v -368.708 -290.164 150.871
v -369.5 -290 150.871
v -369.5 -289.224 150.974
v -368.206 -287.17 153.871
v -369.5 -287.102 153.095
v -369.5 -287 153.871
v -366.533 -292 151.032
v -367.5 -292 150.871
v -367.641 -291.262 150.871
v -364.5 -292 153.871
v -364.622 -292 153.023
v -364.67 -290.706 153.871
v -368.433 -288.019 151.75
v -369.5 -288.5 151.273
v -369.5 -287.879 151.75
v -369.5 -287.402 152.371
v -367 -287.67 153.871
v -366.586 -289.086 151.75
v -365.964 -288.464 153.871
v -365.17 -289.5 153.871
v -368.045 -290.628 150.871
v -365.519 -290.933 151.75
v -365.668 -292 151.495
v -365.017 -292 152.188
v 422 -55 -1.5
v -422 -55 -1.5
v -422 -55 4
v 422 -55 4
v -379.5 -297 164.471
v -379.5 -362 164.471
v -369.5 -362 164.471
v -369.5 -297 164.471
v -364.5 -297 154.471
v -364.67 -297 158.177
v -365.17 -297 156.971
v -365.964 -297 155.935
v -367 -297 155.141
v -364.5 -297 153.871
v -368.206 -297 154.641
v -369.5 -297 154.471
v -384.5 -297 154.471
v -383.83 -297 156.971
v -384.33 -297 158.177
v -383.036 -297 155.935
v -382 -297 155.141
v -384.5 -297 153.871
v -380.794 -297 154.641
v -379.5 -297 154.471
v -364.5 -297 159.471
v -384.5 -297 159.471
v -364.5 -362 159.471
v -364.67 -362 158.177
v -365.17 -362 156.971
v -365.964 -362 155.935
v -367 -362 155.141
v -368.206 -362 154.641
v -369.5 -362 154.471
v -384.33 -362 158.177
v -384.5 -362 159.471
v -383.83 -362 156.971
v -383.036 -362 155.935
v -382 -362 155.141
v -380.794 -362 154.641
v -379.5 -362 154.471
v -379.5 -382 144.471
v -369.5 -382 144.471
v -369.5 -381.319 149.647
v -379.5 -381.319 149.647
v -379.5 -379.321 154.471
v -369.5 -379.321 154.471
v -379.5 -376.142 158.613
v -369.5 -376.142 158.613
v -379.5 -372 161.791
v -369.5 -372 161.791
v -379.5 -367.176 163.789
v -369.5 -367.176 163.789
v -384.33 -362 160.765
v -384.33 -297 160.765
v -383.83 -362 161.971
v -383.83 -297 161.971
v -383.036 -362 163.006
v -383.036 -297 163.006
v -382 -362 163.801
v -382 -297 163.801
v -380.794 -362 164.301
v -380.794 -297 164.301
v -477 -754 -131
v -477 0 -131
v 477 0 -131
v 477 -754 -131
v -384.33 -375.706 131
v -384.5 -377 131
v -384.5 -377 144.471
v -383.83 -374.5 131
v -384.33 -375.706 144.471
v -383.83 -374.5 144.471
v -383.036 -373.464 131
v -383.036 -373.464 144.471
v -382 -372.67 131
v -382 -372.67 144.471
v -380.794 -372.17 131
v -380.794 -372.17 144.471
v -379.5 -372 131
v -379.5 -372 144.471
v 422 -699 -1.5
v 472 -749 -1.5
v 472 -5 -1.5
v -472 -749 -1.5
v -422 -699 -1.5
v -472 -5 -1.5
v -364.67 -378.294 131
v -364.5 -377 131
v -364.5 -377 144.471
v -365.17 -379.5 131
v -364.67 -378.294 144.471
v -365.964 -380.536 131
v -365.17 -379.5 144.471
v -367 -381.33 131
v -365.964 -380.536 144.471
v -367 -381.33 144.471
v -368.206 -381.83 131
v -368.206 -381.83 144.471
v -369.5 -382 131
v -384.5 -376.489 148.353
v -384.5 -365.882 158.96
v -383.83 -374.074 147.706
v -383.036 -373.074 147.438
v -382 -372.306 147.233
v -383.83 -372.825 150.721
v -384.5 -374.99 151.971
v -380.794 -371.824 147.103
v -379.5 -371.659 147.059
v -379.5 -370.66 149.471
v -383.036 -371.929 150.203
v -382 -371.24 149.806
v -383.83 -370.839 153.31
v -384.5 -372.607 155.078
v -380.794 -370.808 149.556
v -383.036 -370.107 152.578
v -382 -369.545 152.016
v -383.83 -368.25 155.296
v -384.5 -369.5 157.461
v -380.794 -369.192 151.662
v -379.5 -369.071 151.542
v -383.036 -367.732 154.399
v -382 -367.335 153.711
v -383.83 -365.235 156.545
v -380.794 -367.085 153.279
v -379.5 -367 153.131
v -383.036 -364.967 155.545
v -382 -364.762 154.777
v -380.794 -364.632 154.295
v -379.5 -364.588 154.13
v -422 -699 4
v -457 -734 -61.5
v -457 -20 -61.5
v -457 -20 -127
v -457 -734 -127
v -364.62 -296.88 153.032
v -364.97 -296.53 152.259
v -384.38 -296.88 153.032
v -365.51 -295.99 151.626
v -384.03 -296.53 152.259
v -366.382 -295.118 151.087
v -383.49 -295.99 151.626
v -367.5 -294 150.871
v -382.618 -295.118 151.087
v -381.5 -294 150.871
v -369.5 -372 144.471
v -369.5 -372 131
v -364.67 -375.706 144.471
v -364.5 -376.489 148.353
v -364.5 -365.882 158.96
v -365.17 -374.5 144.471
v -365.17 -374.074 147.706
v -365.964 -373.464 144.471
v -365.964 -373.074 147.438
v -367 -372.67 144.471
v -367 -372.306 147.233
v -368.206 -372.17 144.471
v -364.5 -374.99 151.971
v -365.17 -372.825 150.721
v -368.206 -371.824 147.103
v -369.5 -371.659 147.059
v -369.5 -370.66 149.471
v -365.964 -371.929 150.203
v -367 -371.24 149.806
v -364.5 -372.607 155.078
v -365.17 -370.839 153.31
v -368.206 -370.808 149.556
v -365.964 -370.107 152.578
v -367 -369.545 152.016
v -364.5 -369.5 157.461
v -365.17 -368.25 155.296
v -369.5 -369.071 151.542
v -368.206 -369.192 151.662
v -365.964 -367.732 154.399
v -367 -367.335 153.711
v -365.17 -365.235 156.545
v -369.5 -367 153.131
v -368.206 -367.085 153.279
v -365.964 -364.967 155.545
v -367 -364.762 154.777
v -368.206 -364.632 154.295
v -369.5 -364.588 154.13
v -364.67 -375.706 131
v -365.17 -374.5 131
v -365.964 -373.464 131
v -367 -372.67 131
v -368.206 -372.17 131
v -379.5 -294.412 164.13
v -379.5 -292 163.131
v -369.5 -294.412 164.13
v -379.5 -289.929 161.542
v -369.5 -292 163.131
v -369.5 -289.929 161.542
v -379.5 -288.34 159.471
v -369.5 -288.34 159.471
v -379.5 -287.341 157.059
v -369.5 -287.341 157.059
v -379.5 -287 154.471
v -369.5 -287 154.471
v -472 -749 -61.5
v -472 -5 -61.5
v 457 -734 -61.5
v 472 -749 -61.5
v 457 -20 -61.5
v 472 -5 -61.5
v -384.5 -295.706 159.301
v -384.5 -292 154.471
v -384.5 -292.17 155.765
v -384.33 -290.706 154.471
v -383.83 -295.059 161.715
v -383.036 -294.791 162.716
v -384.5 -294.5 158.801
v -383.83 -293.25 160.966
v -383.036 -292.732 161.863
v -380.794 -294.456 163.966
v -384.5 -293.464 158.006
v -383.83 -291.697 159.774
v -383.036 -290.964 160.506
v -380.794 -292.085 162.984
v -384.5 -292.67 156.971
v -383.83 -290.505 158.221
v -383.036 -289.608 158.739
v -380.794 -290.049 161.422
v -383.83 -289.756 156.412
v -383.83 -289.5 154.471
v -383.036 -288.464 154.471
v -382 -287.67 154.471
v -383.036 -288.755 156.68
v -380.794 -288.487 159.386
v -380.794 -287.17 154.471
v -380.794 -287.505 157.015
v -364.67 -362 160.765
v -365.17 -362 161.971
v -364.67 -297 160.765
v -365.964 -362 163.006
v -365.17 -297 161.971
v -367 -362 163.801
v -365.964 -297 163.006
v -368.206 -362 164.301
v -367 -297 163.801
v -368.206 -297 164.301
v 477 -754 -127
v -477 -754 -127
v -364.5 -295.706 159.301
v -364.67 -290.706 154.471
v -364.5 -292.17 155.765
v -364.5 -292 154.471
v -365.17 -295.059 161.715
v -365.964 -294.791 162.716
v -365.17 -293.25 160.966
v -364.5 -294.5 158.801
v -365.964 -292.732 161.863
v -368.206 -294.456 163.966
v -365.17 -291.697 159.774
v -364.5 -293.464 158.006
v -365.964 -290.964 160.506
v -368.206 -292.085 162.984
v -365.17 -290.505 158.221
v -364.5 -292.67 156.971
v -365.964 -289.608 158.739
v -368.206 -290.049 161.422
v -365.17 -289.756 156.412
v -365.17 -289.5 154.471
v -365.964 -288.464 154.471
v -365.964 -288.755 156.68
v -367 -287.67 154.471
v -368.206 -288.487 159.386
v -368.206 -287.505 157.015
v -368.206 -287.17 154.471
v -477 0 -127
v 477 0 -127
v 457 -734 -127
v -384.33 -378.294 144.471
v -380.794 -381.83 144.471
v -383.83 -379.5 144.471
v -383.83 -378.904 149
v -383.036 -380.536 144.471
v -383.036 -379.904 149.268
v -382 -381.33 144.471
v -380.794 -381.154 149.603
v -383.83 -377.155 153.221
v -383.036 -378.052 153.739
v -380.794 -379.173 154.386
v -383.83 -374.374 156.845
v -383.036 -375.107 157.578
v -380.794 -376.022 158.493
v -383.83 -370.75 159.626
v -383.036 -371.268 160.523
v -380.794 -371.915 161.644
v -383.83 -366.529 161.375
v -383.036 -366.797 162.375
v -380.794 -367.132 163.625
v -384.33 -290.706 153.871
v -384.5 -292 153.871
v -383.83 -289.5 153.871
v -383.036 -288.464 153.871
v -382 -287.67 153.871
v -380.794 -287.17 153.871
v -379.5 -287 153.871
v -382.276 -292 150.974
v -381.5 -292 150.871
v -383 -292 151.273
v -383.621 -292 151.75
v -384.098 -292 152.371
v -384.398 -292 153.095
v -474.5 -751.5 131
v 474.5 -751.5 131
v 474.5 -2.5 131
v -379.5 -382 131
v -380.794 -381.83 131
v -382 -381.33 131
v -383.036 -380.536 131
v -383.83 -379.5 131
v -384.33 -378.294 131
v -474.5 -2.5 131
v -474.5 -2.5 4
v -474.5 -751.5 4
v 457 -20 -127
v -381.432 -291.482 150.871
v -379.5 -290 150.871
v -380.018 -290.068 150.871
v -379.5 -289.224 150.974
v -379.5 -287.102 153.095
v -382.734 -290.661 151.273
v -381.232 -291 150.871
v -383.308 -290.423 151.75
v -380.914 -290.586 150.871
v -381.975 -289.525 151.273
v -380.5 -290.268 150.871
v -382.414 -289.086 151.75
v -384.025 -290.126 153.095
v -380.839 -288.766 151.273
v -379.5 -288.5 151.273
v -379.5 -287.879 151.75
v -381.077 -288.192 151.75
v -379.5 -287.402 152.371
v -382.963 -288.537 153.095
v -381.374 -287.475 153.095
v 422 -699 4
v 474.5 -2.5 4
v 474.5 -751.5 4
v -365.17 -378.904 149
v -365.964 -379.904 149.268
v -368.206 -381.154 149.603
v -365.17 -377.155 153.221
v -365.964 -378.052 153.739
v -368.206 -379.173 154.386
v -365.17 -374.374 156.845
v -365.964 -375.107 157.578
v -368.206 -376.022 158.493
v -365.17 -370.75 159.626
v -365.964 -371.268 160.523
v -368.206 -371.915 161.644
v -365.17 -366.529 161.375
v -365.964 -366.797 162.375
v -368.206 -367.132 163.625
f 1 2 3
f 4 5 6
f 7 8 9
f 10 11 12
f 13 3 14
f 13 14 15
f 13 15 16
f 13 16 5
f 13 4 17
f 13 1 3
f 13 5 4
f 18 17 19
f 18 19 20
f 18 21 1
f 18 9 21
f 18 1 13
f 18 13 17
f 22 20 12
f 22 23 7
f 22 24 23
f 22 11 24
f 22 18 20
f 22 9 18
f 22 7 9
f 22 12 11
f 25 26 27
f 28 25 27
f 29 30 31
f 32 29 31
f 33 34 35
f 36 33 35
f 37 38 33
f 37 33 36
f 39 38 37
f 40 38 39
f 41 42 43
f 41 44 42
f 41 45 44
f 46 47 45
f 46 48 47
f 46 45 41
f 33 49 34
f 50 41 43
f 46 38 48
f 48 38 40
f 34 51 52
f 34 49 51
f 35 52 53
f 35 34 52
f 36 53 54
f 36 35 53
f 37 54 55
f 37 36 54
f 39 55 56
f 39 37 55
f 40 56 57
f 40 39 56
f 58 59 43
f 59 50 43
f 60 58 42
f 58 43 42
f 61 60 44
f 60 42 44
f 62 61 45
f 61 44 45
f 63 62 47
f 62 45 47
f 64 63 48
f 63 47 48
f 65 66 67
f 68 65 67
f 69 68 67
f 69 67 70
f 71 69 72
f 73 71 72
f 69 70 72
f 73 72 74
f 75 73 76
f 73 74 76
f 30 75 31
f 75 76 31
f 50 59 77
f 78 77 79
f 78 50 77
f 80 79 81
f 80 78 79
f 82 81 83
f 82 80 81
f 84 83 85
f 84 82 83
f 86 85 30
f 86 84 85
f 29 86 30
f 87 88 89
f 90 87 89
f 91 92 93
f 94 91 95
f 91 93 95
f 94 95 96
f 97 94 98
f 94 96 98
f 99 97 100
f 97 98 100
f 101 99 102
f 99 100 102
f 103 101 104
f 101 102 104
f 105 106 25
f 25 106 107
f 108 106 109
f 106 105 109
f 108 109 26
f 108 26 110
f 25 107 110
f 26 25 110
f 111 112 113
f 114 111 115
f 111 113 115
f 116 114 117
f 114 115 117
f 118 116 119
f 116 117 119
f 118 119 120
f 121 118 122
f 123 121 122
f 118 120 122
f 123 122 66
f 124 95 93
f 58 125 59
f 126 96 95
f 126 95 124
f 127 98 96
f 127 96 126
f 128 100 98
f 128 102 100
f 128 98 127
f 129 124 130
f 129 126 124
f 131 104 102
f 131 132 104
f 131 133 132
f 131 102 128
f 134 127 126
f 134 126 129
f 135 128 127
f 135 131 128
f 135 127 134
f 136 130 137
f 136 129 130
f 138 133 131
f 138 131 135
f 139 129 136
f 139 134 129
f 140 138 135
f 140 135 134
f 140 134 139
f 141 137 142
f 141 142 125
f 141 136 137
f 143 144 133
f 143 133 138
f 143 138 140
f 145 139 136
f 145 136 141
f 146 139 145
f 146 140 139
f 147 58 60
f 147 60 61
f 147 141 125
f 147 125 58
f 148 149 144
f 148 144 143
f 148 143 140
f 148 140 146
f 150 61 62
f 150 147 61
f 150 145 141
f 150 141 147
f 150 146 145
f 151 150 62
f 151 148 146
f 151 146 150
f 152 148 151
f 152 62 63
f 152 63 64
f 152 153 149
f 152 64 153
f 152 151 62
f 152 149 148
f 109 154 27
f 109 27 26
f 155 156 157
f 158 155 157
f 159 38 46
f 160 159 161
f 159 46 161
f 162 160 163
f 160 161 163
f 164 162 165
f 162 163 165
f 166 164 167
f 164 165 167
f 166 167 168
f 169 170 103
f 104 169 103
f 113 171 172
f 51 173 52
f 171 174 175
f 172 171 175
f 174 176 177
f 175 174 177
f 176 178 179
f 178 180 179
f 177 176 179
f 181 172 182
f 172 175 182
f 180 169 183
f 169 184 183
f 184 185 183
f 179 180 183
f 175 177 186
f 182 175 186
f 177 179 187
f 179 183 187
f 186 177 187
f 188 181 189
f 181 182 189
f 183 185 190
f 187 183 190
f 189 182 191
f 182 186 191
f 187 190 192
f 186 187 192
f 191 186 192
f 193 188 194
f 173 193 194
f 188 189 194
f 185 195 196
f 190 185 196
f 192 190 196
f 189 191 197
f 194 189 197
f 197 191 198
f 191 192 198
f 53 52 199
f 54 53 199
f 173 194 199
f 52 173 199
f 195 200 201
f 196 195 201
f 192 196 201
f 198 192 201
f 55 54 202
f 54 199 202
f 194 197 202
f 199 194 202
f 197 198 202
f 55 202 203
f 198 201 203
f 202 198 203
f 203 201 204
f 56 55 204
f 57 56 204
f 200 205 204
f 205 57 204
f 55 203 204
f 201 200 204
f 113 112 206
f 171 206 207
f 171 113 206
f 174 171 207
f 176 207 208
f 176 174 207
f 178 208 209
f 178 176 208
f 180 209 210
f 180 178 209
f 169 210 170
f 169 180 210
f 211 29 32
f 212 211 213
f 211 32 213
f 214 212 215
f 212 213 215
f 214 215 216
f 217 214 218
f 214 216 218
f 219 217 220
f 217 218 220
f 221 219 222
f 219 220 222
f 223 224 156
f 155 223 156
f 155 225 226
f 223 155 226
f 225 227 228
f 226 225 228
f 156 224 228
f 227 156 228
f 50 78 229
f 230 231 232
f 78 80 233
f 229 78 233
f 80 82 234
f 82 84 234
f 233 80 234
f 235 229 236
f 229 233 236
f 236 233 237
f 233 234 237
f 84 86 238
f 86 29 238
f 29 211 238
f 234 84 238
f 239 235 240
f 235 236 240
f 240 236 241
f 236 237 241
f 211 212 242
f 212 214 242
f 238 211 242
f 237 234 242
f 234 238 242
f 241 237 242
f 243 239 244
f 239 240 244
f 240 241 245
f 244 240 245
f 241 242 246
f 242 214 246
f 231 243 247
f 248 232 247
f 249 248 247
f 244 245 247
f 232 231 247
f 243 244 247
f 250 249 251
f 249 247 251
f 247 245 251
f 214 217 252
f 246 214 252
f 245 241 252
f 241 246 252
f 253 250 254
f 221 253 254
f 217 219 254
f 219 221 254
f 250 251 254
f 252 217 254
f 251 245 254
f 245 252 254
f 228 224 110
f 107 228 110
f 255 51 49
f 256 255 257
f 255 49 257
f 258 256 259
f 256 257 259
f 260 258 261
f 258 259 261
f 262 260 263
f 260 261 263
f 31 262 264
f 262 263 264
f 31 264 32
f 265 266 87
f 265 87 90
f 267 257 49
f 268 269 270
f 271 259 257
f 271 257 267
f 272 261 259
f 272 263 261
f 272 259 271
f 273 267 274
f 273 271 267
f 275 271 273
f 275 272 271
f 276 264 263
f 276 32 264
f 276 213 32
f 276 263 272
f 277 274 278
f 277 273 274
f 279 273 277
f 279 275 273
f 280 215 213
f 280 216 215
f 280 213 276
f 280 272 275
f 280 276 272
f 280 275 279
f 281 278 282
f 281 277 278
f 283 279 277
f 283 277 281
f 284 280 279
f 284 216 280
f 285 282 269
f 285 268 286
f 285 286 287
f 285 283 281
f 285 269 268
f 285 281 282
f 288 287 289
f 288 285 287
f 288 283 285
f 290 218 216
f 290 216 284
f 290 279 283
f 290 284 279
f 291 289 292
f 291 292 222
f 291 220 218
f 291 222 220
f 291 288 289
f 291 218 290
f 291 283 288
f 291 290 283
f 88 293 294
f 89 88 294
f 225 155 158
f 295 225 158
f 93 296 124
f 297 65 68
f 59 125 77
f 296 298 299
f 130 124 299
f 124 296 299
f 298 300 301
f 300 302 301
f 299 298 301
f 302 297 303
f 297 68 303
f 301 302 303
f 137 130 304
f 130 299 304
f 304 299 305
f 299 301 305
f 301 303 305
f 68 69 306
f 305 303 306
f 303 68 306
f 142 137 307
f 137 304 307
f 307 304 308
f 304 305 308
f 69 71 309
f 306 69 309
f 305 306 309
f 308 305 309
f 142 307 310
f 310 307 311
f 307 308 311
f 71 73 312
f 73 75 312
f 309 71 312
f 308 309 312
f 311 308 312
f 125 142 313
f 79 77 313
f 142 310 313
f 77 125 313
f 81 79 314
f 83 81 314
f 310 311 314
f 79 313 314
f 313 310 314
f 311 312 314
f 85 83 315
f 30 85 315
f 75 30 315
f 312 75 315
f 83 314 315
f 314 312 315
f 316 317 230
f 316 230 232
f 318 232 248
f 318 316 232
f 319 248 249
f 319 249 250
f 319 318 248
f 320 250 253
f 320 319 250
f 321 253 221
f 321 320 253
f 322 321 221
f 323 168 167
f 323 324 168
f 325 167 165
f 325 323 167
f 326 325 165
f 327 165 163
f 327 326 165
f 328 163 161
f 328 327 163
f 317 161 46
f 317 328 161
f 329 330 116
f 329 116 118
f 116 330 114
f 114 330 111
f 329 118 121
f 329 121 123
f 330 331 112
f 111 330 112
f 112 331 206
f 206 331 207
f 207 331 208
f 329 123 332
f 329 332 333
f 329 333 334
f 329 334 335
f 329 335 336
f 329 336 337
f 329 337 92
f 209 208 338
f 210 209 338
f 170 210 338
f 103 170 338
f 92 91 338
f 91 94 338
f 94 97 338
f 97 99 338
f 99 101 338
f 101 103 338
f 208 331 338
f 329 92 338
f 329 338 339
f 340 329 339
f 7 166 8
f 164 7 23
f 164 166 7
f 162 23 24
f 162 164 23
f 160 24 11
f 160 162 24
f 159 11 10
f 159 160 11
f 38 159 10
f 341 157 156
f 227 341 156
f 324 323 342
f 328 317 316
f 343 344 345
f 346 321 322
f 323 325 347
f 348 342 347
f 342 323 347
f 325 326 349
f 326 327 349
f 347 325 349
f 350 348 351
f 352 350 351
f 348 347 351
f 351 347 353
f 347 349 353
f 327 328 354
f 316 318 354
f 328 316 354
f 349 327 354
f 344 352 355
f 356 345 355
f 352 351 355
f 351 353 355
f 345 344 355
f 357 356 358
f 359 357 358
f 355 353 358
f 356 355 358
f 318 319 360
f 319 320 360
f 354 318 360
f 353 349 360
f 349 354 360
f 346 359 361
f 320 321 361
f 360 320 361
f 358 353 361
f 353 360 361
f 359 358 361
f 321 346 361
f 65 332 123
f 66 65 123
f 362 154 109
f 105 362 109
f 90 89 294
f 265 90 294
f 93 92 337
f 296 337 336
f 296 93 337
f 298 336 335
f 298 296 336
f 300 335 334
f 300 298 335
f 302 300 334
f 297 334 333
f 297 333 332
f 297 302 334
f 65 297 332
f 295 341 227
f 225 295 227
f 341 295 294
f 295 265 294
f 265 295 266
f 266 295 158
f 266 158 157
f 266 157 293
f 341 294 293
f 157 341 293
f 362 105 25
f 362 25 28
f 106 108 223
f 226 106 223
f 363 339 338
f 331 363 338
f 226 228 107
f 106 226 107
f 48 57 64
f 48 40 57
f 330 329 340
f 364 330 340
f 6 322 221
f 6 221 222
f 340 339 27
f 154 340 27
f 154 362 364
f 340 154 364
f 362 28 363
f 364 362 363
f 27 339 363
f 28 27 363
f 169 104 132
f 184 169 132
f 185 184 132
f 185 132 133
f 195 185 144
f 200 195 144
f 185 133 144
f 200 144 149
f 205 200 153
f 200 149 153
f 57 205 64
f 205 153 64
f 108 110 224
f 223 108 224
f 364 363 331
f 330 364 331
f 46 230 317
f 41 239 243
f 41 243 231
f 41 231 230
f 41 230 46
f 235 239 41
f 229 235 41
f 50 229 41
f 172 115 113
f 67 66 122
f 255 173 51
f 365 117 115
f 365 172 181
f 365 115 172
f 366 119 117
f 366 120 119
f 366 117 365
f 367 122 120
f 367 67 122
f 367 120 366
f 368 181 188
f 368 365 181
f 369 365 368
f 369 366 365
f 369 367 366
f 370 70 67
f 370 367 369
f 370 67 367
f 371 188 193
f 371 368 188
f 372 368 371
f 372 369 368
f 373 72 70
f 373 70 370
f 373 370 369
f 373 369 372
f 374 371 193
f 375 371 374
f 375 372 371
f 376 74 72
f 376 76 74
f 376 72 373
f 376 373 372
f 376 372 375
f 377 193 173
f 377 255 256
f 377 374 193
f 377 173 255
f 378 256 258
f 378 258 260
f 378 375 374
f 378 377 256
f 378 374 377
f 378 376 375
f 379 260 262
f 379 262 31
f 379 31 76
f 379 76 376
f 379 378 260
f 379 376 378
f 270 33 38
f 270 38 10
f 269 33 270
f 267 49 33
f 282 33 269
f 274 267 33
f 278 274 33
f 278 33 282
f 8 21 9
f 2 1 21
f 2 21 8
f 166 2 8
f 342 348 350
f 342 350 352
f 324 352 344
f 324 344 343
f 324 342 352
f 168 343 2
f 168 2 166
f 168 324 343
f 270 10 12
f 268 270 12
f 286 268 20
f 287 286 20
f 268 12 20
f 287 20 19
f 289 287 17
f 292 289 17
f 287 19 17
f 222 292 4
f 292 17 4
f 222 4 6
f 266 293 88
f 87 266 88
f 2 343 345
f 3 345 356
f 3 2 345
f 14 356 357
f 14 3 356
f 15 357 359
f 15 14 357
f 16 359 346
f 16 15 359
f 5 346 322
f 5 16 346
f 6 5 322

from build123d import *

# Parameters (mm, degrees)
F1_DEPTH = 754
F3_DEPTH = 999
F6_W     = 20
F6_H     = 10
F8_R     = 4.99999
F9_R     = 3


# Not quite as in the source:
# - a fillet or chamfer is up to 0.001 mm smaller than in the source, because OpenCascade refuses the exact size


with BuildPart() as f1:
    # F0 (on Front) → F1 (new body)
    with BuildSketch(Plane.XZ):
        Polygon((-477, -127), (-477, -131), (477, -131), (477, -127), (457, -127), (457, -61.5), (472, -61.5), (472, -1.5), (422, -1.5), (422, 4), (474.5, 4), (474.5, 131), (-474.5, 131), (-474.5, 4), (-422, 4), (-422, -1.5), (-472, -1.5), (-472, -61.5), (-457, -61.5), (-457, -127), align=None)
    extrude(amount=F1_DEPTH)

    # F2 (on face) → F3 (cut)
    with BuildSketch(Plane(origin=(-474.5, 0, 0), x_dir=(0, -1, 0), z_dir=(-1, 0, 0))):
        Polygon((754, -127), (754, -131), (765.5175328255, -131), (774.4438648224, 131), (751.5, 131), (751.5, 4), (699, 4), (699, -1.5), (749, -1.5), (749, -61.5), (734, -61.5), (734, -127), align=None)
        Polygon((55, 4), (2.5, 4), (2.5, 131), (-20.4438648224, 131), (-11.5175328255, -131), (0, -131), (0, -127), (20, -127), (20, -61.5), (5, -61.5), (5, -1.5), (55, -1.5), align=None)
    extrude(amount=-F3_DEPTH, mode=Mode.SUBTRACT)

    # F7: sweep along a path in F5
    with BuildLine(Plane(origin=(-374.5, 0, 0), x_dir=(0, -1, 0), z_dir=(-1, 0, 0))) as f7_path:
        Line((377, 131), (377, 144.4709453487))
        ThreePointArc((377, 144.4709453487), (372.6066017178, 155.0775470665), (362, 159.4709453487))
        Line((362, 159.4709453487), (297, 159.4709453487))
        ThreePointArc((297, 159.4709453487), (293.4644660941, 158.0064792547), (292, 154.4709453487))
        Line((292, 154.4709453487), (292, 150.8713660145))
    # F6 (on face) → F7 (sweep)
    with BuildSketch(Plane.XY.offset(131)):
        with Locations((-374.5, -377)):
            Rectangle(F6_W, F6_H)
    sweep(path=f7_path.line)

    # F8 (radius 5 in the source; OpenCascade refuses exactly that, so slightly less here)
    f8_edges = [f1.edges().sort_by_distance(p)[0] for p in [
        (-384.5, -329.5, 164.470945),
        (-384.5, -329.5, 154.470945),
        (-364.5, -329.5, 164.470945),
        (-364.5, -329.5, 154.470945),
    ]]
    fillet(f8_edges, radius=F8_R)

    # F9
    f9_edges = [f1.edges().sort_by_distance(p)[0] for p in [
        (-374.5, -287, 150.871366),
        (-374.5, -297, 150.871366),
        (-384.5, -294.499995, 150.871366),
    ]]
    fillet(f9_edges, radius=F9_R)


solid = f1.part
